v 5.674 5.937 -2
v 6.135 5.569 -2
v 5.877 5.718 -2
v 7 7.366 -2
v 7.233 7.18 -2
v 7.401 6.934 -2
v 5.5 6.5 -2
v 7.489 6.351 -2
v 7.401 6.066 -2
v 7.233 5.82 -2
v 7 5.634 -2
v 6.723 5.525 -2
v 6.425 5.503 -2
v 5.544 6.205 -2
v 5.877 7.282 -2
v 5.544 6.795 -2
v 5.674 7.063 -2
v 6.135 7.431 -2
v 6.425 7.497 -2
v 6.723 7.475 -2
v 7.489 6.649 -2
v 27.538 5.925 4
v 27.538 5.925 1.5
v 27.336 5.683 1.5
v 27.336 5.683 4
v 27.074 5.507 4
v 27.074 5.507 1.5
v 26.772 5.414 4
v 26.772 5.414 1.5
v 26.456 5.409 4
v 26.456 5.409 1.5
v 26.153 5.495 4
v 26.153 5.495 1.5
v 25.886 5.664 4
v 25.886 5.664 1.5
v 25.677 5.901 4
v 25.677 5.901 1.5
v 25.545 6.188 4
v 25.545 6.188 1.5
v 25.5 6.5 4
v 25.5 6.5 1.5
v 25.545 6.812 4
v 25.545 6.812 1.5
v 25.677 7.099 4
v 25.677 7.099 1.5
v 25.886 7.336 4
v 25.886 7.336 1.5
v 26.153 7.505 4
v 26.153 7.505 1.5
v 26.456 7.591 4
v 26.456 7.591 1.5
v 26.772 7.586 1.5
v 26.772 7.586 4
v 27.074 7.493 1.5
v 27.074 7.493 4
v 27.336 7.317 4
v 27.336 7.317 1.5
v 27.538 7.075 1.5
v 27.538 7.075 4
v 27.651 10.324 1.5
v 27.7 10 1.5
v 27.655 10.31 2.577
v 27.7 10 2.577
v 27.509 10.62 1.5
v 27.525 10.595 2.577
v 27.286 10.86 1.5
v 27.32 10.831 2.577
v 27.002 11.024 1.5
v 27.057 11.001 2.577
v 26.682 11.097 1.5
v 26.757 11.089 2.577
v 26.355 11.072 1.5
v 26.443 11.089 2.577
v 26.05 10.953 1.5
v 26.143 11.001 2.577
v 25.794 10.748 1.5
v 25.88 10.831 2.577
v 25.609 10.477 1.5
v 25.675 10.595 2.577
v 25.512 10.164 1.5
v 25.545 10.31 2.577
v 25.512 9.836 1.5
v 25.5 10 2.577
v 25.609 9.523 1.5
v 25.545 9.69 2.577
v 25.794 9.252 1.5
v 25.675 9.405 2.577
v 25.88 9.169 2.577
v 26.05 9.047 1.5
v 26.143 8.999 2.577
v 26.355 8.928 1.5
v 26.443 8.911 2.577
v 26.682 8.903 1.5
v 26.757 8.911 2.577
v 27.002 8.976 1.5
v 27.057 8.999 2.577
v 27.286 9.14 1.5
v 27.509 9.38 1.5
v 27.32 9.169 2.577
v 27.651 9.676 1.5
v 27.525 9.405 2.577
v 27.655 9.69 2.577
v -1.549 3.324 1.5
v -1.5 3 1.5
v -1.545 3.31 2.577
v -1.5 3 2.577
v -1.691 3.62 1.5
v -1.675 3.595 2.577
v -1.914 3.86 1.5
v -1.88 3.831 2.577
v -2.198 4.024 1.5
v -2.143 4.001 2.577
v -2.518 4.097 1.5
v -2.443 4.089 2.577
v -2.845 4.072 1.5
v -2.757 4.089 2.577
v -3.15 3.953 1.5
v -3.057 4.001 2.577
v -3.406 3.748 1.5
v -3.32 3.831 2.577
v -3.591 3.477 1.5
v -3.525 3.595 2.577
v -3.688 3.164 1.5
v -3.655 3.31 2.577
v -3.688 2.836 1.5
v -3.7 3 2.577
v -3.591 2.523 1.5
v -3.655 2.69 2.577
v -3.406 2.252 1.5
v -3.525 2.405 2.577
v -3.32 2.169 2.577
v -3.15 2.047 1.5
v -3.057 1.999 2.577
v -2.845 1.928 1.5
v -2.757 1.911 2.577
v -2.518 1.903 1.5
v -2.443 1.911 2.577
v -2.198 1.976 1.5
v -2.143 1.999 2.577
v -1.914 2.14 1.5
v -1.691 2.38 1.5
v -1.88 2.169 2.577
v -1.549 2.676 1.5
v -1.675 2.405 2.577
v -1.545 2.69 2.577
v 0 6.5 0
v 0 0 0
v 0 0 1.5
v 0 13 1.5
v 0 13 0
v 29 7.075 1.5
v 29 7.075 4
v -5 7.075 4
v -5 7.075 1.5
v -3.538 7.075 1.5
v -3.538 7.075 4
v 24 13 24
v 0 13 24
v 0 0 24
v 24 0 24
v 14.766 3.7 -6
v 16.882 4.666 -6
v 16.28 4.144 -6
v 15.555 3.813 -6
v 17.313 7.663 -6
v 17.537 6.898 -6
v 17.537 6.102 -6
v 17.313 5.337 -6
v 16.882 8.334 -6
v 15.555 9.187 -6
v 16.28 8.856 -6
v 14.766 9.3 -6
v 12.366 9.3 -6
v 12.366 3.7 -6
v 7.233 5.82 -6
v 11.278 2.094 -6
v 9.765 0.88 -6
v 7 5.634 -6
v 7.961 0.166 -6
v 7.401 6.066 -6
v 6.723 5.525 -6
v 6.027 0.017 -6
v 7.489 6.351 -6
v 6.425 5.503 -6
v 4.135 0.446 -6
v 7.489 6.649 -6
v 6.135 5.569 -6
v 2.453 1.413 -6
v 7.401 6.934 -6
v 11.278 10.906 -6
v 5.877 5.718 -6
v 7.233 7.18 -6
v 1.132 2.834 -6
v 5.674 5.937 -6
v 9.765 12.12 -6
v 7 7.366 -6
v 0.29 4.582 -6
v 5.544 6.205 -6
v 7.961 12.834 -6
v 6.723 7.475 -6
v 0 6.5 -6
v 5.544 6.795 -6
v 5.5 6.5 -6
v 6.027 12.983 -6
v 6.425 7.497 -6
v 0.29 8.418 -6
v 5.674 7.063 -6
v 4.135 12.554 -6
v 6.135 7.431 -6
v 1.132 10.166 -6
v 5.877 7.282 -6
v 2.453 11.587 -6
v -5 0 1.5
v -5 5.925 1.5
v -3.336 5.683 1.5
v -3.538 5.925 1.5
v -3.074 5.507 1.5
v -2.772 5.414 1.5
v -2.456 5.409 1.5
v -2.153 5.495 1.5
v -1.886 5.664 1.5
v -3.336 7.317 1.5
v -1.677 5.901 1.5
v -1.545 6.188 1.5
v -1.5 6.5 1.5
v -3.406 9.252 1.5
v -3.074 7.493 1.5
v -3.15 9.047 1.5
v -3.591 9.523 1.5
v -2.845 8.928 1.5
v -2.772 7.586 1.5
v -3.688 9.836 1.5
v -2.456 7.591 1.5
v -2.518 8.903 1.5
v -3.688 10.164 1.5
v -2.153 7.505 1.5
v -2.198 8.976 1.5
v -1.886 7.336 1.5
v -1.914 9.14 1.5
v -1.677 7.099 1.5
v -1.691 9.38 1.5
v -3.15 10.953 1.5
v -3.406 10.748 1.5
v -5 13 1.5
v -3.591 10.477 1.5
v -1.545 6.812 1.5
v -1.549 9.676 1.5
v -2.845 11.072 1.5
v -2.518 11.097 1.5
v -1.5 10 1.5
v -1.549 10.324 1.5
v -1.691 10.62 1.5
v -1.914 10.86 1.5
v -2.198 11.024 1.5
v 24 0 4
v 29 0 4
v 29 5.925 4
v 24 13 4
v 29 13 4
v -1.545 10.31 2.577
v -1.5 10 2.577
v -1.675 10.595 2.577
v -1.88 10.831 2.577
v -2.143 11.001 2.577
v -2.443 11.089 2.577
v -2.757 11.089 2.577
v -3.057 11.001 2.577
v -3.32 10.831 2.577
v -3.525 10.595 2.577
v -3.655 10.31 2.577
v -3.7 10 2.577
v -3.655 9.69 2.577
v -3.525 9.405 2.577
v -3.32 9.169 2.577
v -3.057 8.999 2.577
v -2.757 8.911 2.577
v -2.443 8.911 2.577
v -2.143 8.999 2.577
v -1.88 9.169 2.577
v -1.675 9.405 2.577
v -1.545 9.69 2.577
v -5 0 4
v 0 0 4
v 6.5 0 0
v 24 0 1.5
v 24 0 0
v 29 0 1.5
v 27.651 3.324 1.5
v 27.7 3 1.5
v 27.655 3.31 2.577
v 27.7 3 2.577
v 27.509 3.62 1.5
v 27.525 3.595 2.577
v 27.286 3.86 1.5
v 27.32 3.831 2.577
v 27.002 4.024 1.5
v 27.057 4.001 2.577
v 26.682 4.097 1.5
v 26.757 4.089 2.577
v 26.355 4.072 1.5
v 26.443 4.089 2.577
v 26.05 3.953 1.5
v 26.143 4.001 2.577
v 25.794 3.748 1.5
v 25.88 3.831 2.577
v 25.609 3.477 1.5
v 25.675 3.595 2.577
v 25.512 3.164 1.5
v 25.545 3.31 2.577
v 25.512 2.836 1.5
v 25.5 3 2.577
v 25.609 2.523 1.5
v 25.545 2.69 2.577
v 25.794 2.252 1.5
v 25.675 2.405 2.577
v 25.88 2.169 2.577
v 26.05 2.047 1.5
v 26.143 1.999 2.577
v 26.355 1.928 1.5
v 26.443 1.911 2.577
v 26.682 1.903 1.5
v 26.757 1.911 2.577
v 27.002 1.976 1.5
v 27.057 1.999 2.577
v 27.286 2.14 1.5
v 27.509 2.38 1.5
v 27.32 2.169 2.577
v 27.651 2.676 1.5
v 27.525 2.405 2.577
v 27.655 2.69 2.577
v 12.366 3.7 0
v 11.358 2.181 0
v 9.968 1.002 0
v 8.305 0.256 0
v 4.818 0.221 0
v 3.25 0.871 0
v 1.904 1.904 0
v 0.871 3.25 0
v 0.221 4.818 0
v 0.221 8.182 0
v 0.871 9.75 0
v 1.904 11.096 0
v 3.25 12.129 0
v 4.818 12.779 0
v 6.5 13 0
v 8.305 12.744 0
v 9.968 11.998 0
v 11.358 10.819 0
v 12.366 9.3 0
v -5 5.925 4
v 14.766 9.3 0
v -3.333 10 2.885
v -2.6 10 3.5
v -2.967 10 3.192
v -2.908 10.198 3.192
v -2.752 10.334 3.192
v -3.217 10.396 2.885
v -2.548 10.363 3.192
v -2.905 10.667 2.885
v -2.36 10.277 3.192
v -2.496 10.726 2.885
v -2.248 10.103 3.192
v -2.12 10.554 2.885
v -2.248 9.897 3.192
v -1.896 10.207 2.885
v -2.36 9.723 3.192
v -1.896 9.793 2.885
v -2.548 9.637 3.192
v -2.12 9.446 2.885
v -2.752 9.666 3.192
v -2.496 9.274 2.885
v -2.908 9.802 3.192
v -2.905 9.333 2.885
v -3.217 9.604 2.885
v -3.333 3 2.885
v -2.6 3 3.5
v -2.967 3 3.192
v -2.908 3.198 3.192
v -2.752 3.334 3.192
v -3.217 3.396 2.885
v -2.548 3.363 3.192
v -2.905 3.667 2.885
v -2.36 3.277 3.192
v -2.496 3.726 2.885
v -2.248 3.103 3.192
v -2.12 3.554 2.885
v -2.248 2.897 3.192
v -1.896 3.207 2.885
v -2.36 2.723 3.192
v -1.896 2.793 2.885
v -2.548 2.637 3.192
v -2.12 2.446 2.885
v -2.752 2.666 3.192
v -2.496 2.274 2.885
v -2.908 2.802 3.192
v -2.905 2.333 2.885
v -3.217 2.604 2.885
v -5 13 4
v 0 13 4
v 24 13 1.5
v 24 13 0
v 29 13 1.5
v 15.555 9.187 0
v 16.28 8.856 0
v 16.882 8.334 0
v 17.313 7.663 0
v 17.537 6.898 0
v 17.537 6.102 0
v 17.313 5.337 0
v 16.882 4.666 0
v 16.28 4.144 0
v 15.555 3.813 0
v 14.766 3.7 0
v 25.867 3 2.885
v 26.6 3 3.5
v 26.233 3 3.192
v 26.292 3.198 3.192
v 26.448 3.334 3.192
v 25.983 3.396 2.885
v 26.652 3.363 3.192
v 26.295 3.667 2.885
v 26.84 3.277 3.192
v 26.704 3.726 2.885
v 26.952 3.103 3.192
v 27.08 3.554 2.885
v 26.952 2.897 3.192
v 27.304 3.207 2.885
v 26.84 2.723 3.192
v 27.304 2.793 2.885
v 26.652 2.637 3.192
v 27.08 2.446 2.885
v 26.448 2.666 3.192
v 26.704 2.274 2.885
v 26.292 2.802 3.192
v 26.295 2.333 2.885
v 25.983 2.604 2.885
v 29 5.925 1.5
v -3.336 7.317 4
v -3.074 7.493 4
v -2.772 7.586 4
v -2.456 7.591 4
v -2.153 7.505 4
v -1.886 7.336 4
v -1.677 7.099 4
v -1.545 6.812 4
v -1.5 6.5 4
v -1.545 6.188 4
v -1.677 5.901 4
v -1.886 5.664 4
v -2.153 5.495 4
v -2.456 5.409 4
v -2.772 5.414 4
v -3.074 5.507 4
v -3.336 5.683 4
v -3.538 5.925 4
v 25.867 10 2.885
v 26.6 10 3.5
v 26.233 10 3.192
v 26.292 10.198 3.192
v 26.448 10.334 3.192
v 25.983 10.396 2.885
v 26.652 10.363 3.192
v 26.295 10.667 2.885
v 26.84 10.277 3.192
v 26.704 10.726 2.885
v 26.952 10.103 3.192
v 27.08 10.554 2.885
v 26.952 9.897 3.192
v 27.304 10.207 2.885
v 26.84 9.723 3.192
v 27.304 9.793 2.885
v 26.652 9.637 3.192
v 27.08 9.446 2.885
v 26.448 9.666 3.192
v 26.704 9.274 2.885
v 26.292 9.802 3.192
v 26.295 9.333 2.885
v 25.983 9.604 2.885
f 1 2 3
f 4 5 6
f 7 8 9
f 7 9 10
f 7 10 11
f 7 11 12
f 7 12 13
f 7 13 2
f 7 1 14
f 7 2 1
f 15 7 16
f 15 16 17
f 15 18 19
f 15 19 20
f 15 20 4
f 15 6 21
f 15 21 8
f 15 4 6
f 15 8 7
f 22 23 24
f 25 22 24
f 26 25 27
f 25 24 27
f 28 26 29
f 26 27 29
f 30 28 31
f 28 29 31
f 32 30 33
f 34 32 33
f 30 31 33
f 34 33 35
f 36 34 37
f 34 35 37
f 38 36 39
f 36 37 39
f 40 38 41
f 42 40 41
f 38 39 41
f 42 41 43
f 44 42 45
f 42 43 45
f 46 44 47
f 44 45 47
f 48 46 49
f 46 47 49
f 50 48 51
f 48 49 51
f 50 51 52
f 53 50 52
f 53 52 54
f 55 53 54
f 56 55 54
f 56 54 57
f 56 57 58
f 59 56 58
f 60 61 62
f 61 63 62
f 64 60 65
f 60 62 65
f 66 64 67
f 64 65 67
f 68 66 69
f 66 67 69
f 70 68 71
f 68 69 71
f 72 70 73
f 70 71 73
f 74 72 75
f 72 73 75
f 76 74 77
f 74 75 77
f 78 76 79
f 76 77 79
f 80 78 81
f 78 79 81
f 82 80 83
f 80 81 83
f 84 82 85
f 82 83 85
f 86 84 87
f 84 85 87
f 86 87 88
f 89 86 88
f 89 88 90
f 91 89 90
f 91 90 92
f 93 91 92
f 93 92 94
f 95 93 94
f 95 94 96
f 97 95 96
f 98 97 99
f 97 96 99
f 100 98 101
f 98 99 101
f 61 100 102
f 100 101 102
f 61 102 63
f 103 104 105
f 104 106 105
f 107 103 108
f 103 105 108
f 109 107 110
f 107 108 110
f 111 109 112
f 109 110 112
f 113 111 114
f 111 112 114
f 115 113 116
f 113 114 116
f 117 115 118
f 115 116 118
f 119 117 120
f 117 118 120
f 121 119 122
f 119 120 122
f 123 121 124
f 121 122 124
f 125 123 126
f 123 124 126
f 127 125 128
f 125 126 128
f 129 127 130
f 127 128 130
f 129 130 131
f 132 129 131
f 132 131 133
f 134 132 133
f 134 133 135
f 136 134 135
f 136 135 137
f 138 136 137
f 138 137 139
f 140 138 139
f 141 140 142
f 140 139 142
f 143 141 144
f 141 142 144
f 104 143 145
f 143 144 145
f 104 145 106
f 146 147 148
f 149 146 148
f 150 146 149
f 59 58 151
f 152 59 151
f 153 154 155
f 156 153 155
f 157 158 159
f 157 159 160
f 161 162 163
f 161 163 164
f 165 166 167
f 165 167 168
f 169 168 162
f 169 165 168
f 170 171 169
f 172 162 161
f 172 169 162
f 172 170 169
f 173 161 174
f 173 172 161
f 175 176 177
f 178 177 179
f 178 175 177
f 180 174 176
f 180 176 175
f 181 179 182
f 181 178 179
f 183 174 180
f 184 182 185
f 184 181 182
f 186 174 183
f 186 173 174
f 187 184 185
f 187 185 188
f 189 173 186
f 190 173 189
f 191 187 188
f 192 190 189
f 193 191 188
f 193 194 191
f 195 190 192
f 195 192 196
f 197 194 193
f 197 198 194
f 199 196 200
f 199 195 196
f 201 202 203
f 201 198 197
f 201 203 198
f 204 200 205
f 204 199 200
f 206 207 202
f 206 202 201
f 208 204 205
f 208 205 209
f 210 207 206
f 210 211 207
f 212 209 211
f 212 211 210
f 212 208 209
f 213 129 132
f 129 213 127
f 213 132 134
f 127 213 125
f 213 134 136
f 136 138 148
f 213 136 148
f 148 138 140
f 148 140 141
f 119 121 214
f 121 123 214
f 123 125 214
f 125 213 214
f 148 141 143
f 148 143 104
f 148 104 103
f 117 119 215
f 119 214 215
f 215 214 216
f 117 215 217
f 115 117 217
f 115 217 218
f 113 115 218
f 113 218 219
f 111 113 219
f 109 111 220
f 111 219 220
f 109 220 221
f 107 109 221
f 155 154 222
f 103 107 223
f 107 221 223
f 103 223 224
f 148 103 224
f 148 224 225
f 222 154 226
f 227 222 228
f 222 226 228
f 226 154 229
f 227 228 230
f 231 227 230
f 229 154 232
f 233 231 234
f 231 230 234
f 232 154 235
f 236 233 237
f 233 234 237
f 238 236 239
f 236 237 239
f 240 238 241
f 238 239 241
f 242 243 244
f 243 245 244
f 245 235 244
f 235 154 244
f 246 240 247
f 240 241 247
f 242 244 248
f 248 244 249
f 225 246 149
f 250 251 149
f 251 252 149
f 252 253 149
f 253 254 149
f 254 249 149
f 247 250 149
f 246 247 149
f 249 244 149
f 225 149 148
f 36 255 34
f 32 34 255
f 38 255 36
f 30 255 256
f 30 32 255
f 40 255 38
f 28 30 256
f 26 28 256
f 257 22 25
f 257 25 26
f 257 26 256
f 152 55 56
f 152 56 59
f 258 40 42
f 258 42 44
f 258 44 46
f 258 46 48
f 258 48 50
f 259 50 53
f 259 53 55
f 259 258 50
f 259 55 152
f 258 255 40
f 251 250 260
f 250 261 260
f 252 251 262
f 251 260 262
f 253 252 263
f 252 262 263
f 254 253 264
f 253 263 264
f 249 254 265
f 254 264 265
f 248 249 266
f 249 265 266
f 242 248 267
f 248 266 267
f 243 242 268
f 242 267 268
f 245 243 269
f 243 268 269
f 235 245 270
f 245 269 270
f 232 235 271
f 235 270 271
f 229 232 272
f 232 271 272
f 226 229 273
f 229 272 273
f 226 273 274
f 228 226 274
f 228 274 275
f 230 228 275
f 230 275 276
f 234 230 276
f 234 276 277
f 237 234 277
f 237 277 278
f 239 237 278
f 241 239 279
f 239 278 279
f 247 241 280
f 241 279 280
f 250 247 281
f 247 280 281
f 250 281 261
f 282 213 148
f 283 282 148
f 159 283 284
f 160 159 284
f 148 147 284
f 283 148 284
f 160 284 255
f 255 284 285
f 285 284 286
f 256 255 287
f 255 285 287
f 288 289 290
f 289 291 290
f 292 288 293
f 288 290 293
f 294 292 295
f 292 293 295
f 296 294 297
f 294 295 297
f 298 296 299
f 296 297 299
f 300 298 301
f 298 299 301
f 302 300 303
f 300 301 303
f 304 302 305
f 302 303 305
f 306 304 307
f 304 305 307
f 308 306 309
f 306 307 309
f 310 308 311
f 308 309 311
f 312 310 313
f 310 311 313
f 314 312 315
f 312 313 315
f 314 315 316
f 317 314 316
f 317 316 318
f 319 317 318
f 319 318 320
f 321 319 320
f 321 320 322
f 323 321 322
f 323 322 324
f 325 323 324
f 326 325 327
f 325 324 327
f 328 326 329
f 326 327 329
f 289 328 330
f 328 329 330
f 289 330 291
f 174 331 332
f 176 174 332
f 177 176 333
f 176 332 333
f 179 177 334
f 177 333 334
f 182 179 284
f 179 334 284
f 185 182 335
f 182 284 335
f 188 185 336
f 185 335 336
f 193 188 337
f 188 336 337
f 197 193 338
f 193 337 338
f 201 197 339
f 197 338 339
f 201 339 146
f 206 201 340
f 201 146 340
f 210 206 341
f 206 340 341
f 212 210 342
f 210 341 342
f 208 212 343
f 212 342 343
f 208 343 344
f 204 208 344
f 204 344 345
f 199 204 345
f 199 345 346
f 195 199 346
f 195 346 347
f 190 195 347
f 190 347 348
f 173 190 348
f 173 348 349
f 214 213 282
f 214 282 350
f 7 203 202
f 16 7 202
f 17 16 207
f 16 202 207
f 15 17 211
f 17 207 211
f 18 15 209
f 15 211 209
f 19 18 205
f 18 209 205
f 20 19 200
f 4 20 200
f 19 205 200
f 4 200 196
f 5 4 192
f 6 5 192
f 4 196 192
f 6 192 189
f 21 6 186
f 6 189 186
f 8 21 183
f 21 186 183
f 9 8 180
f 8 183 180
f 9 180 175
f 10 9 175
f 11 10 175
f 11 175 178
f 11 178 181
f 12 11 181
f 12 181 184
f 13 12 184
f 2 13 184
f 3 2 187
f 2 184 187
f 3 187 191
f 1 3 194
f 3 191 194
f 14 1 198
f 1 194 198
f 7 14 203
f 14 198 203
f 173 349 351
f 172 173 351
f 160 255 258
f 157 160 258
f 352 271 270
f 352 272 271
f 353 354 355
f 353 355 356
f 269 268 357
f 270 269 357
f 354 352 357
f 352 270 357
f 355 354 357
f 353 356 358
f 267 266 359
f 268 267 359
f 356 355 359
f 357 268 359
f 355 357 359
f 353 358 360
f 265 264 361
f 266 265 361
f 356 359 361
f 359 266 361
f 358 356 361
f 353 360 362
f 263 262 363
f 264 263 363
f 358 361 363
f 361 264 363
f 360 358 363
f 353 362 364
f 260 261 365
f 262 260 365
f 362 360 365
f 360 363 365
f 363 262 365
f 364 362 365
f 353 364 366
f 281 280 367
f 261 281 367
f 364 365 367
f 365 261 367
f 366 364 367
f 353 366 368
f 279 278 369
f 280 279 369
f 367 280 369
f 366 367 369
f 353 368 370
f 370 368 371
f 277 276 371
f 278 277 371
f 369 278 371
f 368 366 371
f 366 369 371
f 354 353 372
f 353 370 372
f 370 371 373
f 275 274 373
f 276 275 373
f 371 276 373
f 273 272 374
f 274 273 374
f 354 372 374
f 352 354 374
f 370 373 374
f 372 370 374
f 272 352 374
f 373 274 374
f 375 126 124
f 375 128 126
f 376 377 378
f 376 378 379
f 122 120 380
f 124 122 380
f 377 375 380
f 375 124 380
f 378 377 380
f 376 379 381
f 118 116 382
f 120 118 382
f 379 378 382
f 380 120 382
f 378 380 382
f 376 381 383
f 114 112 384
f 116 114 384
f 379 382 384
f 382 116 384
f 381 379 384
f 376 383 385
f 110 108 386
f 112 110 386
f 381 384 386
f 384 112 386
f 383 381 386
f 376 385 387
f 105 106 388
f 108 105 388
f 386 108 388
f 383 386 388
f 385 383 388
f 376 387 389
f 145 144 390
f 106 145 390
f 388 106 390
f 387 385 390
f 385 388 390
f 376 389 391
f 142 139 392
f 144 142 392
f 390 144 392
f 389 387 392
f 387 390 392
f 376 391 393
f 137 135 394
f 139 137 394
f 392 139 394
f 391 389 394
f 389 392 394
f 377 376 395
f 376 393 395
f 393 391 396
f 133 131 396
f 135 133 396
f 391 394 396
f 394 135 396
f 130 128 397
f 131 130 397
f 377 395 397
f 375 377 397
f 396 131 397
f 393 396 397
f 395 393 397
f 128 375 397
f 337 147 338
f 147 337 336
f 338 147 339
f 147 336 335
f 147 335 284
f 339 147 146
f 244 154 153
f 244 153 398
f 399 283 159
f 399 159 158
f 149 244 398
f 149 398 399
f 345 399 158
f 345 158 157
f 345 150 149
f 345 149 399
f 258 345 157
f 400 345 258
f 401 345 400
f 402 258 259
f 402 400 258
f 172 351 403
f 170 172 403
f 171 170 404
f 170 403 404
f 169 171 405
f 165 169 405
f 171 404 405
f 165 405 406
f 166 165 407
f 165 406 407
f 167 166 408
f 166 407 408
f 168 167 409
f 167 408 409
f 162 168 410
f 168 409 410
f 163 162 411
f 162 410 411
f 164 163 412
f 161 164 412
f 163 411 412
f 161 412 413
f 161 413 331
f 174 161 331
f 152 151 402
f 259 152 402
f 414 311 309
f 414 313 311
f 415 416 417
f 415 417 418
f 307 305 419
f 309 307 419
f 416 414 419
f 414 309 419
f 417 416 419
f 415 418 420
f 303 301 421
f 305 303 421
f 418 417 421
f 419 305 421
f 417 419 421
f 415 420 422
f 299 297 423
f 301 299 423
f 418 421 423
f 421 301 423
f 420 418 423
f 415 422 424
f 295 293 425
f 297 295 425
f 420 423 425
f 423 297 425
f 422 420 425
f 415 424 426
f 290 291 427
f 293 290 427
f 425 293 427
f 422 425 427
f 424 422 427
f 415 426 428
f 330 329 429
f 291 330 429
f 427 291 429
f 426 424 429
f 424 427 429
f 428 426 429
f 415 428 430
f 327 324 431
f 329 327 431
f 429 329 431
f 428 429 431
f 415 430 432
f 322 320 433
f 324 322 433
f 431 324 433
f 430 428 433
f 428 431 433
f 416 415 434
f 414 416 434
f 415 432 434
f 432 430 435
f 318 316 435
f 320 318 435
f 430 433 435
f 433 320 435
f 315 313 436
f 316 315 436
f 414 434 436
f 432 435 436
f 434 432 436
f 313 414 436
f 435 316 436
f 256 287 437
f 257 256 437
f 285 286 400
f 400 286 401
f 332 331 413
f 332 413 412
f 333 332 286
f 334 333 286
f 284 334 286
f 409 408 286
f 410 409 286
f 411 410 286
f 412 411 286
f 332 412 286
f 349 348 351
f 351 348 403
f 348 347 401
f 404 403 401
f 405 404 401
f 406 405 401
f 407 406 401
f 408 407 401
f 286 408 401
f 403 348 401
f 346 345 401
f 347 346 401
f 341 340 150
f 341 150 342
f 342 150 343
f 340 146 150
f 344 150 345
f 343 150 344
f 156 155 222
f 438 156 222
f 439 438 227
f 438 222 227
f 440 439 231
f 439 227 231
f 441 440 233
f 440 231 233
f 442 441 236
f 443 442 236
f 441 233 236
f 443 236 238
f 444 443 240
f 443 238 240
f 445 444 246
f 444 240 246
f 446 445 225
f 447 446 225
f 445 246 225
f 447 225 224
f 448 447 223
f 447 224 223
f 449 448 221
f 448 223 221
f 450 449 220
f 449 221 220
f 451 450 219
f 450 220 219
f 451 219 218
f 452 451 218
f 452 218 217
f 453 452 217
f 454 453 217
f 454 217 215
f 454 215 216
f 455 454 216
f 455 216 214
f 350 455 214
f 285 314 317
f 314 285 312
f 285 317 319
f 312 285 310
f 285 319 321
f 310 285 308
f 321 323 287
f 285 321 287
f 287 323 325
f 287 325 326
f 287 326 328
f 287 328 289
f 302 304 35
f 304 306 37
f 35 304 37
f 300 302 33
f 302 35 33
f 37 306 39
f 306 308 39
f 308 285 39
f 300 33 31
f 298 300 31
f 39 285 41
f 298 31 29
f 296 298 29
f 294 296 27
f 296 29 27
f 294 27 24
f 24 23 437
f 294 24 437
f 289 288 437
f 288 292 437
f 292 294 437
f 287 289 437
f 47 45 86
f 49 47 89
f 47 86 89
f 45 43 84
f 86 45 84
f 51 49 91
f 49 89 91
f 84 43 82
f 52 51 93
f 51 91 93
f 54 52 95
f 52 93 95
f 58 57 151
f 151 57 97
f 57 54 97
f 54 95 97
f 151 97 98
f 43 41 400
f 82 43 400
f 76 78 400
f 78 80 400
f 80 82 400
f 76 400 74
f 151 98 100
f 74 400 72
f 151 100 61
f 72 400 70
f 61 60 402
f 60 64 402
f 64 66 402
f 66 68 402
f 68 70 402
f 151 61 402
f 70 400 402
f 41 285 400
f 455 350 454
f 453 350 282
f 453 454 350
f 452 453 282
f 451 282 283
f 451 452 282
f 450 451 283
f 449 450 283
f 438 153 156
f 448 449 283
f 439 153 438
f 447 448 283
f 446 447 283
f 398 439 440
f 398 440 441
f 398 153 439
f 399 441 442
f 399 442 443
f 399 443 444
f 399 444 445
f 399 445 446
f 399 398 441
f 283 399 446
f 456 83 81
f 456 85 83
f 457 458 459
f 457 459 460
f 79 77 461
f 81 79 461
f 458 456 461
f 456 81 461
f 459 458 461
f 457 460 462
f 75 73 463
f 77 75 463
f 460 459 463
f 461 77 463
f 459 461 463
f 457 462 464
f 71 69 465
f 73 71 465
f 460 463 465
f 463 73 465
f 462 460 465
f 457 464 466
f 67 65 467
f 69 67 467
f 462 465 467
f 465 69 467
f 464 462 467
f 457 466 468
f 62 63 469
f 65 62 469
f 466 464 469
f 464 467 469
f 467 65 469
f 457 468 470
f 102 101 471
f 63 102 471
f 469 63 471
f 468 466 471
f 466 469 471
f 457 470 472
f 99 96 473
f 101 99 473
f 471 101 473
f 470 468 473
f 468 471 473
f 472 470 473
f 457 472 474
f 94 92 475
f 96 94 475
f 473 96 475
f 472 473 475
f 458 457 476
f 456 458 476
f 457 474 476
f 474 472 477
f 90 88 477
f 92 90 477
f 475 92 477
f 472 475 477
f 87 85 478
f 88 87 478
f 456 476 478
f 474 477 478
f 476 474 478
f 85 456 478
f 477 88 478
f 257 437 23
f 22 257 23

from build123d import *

# Parameters (mm, degrees)
SKETCH_1_W          = 24
SKETCH_1_H          = 13
EXTRUDE_1_DEPTH     = 24
SKETCH_2_W          = 34
SKETCH_2_H          = 13
EXTRUDE_2_DEPTH     = 2.5
MM_13_D             = 2.2
MM_13_DEPTH         = 1.076990406
MM_13_TIP           = 0.923009594
CUT_EXTRUDE_1_DEPTH = 3.5
EXTRUDE_3_DEPTH     = 6
SKETCH_42_R         = 1
CUT_EXTRUDE_2_DEPTH = 4


with BuildPart() as part:
    # 草图1 → 凸台-拉伸1 (new body)
    with BuildSketch(Plane.XY):
        with Locations((12, 6.5)):
            Rectangle(SKETCH_1_W, SKETCH_1_H)
    extrude(amount=EXTRUDE_1_DEPTH)

    # 草图2 → 凸台-拉伸2 (add)
    with BuildSketch(Plane.XY.offset(1.5)):
        with Locations((12, 6.5)):
            Rectangle(SKETCH_2_W, SKETCH_2_H)
    extrude(amount=EXTRUDE_2_DEPTH)

    # 大小mm 暗销孔13
    with Locations(Plane(origin=(0, 0, 1.5), x_dir=(-1, 0, 0), z_dir=(0, 0, -1))):
        with Locations((2.6, 10), (2.6, 3), (-26.6, 10), (-26.6, 3)):
            Hole(MM_13_D / 2, depth=MM_13_DEPTH)
            with Locations((0, 0, -(MM_13_DEPTH + MM_13_TIP / 2))):  # 100° drill point
                Cone(0, MM_13_D / 2, MM_13_TIP, mode=Mode.SUBTRACT)

    # 草图6 → 切除-拉伸1 (cut)
    with BuildSketch(Plane.XY.offset(1.5)):
        with BuildLine():
            Line((-5, 7.074764733), (-3.537894185, 7.074764733))
            ThreePointArc((-3.537894185, 7.074764733), (-1.5, 6.5), (-3.537894185, 5.925235267))
            Line((-3.537894185, 5.925235267), (-5, 5.925235267))
            Line((-5, 5.925235267), (-5, 7.074764733))
        make_face()
        with BuildLine():
            Line((29, 5.925235267), (27.537894185, 5.925235267))
            ThreePointArc((27.537894185, 5.925235267), (25.5, 6.5), (27.537894185, 7.074764733))
            Line((27.537894185, 7.074764733), (29, 7.074764733))
            Line((29, 7.074764733), (29, 5.925235267))
        make_face()
    extrude(amount=CUT_EXTRUDE_1_DEPTH, mode=Mode.SUBTRACT)

    # 草图27 → 凸台-拉伸3 (add)
    with BuildSketch(Plane(origin=(0, 0, 0), x_dir=(-1, 0, 0), z_dir=(0, 0, -1))):
        with BuildLine():
            Line((-14.765807305, 3.7), (-12.36600375, 3.7))
            ThreePointArc((-12.36600375, 3.7), (0, 6.5), (-12.36600375, 9.3))
            Line((-12.36600375, 9.3), (-14.765807305, 9.3))
            ThreePointArc((-14.765807305, 9.3), (-17.565807305, 6.5), (-14.765807305, 3.7))
        make_face()
    extrude(amount=EXTRUDE_3_DEPTH)

    # 草图42 → 切除-拉伸2 (cut)
    with BuildSketch(Plane(origin=(0, 0, -6), x_dir=(-1, 0, 0), z_dir=(0, 0, -1))):
        with Locations((-6.5, 6.5)):
            Circle(SKETCH_42_R)
    extrude(amount=-CUT_EXTRUDE_2_DEPTH, mode=Mode.SUBTRACT)


solid = part.part
